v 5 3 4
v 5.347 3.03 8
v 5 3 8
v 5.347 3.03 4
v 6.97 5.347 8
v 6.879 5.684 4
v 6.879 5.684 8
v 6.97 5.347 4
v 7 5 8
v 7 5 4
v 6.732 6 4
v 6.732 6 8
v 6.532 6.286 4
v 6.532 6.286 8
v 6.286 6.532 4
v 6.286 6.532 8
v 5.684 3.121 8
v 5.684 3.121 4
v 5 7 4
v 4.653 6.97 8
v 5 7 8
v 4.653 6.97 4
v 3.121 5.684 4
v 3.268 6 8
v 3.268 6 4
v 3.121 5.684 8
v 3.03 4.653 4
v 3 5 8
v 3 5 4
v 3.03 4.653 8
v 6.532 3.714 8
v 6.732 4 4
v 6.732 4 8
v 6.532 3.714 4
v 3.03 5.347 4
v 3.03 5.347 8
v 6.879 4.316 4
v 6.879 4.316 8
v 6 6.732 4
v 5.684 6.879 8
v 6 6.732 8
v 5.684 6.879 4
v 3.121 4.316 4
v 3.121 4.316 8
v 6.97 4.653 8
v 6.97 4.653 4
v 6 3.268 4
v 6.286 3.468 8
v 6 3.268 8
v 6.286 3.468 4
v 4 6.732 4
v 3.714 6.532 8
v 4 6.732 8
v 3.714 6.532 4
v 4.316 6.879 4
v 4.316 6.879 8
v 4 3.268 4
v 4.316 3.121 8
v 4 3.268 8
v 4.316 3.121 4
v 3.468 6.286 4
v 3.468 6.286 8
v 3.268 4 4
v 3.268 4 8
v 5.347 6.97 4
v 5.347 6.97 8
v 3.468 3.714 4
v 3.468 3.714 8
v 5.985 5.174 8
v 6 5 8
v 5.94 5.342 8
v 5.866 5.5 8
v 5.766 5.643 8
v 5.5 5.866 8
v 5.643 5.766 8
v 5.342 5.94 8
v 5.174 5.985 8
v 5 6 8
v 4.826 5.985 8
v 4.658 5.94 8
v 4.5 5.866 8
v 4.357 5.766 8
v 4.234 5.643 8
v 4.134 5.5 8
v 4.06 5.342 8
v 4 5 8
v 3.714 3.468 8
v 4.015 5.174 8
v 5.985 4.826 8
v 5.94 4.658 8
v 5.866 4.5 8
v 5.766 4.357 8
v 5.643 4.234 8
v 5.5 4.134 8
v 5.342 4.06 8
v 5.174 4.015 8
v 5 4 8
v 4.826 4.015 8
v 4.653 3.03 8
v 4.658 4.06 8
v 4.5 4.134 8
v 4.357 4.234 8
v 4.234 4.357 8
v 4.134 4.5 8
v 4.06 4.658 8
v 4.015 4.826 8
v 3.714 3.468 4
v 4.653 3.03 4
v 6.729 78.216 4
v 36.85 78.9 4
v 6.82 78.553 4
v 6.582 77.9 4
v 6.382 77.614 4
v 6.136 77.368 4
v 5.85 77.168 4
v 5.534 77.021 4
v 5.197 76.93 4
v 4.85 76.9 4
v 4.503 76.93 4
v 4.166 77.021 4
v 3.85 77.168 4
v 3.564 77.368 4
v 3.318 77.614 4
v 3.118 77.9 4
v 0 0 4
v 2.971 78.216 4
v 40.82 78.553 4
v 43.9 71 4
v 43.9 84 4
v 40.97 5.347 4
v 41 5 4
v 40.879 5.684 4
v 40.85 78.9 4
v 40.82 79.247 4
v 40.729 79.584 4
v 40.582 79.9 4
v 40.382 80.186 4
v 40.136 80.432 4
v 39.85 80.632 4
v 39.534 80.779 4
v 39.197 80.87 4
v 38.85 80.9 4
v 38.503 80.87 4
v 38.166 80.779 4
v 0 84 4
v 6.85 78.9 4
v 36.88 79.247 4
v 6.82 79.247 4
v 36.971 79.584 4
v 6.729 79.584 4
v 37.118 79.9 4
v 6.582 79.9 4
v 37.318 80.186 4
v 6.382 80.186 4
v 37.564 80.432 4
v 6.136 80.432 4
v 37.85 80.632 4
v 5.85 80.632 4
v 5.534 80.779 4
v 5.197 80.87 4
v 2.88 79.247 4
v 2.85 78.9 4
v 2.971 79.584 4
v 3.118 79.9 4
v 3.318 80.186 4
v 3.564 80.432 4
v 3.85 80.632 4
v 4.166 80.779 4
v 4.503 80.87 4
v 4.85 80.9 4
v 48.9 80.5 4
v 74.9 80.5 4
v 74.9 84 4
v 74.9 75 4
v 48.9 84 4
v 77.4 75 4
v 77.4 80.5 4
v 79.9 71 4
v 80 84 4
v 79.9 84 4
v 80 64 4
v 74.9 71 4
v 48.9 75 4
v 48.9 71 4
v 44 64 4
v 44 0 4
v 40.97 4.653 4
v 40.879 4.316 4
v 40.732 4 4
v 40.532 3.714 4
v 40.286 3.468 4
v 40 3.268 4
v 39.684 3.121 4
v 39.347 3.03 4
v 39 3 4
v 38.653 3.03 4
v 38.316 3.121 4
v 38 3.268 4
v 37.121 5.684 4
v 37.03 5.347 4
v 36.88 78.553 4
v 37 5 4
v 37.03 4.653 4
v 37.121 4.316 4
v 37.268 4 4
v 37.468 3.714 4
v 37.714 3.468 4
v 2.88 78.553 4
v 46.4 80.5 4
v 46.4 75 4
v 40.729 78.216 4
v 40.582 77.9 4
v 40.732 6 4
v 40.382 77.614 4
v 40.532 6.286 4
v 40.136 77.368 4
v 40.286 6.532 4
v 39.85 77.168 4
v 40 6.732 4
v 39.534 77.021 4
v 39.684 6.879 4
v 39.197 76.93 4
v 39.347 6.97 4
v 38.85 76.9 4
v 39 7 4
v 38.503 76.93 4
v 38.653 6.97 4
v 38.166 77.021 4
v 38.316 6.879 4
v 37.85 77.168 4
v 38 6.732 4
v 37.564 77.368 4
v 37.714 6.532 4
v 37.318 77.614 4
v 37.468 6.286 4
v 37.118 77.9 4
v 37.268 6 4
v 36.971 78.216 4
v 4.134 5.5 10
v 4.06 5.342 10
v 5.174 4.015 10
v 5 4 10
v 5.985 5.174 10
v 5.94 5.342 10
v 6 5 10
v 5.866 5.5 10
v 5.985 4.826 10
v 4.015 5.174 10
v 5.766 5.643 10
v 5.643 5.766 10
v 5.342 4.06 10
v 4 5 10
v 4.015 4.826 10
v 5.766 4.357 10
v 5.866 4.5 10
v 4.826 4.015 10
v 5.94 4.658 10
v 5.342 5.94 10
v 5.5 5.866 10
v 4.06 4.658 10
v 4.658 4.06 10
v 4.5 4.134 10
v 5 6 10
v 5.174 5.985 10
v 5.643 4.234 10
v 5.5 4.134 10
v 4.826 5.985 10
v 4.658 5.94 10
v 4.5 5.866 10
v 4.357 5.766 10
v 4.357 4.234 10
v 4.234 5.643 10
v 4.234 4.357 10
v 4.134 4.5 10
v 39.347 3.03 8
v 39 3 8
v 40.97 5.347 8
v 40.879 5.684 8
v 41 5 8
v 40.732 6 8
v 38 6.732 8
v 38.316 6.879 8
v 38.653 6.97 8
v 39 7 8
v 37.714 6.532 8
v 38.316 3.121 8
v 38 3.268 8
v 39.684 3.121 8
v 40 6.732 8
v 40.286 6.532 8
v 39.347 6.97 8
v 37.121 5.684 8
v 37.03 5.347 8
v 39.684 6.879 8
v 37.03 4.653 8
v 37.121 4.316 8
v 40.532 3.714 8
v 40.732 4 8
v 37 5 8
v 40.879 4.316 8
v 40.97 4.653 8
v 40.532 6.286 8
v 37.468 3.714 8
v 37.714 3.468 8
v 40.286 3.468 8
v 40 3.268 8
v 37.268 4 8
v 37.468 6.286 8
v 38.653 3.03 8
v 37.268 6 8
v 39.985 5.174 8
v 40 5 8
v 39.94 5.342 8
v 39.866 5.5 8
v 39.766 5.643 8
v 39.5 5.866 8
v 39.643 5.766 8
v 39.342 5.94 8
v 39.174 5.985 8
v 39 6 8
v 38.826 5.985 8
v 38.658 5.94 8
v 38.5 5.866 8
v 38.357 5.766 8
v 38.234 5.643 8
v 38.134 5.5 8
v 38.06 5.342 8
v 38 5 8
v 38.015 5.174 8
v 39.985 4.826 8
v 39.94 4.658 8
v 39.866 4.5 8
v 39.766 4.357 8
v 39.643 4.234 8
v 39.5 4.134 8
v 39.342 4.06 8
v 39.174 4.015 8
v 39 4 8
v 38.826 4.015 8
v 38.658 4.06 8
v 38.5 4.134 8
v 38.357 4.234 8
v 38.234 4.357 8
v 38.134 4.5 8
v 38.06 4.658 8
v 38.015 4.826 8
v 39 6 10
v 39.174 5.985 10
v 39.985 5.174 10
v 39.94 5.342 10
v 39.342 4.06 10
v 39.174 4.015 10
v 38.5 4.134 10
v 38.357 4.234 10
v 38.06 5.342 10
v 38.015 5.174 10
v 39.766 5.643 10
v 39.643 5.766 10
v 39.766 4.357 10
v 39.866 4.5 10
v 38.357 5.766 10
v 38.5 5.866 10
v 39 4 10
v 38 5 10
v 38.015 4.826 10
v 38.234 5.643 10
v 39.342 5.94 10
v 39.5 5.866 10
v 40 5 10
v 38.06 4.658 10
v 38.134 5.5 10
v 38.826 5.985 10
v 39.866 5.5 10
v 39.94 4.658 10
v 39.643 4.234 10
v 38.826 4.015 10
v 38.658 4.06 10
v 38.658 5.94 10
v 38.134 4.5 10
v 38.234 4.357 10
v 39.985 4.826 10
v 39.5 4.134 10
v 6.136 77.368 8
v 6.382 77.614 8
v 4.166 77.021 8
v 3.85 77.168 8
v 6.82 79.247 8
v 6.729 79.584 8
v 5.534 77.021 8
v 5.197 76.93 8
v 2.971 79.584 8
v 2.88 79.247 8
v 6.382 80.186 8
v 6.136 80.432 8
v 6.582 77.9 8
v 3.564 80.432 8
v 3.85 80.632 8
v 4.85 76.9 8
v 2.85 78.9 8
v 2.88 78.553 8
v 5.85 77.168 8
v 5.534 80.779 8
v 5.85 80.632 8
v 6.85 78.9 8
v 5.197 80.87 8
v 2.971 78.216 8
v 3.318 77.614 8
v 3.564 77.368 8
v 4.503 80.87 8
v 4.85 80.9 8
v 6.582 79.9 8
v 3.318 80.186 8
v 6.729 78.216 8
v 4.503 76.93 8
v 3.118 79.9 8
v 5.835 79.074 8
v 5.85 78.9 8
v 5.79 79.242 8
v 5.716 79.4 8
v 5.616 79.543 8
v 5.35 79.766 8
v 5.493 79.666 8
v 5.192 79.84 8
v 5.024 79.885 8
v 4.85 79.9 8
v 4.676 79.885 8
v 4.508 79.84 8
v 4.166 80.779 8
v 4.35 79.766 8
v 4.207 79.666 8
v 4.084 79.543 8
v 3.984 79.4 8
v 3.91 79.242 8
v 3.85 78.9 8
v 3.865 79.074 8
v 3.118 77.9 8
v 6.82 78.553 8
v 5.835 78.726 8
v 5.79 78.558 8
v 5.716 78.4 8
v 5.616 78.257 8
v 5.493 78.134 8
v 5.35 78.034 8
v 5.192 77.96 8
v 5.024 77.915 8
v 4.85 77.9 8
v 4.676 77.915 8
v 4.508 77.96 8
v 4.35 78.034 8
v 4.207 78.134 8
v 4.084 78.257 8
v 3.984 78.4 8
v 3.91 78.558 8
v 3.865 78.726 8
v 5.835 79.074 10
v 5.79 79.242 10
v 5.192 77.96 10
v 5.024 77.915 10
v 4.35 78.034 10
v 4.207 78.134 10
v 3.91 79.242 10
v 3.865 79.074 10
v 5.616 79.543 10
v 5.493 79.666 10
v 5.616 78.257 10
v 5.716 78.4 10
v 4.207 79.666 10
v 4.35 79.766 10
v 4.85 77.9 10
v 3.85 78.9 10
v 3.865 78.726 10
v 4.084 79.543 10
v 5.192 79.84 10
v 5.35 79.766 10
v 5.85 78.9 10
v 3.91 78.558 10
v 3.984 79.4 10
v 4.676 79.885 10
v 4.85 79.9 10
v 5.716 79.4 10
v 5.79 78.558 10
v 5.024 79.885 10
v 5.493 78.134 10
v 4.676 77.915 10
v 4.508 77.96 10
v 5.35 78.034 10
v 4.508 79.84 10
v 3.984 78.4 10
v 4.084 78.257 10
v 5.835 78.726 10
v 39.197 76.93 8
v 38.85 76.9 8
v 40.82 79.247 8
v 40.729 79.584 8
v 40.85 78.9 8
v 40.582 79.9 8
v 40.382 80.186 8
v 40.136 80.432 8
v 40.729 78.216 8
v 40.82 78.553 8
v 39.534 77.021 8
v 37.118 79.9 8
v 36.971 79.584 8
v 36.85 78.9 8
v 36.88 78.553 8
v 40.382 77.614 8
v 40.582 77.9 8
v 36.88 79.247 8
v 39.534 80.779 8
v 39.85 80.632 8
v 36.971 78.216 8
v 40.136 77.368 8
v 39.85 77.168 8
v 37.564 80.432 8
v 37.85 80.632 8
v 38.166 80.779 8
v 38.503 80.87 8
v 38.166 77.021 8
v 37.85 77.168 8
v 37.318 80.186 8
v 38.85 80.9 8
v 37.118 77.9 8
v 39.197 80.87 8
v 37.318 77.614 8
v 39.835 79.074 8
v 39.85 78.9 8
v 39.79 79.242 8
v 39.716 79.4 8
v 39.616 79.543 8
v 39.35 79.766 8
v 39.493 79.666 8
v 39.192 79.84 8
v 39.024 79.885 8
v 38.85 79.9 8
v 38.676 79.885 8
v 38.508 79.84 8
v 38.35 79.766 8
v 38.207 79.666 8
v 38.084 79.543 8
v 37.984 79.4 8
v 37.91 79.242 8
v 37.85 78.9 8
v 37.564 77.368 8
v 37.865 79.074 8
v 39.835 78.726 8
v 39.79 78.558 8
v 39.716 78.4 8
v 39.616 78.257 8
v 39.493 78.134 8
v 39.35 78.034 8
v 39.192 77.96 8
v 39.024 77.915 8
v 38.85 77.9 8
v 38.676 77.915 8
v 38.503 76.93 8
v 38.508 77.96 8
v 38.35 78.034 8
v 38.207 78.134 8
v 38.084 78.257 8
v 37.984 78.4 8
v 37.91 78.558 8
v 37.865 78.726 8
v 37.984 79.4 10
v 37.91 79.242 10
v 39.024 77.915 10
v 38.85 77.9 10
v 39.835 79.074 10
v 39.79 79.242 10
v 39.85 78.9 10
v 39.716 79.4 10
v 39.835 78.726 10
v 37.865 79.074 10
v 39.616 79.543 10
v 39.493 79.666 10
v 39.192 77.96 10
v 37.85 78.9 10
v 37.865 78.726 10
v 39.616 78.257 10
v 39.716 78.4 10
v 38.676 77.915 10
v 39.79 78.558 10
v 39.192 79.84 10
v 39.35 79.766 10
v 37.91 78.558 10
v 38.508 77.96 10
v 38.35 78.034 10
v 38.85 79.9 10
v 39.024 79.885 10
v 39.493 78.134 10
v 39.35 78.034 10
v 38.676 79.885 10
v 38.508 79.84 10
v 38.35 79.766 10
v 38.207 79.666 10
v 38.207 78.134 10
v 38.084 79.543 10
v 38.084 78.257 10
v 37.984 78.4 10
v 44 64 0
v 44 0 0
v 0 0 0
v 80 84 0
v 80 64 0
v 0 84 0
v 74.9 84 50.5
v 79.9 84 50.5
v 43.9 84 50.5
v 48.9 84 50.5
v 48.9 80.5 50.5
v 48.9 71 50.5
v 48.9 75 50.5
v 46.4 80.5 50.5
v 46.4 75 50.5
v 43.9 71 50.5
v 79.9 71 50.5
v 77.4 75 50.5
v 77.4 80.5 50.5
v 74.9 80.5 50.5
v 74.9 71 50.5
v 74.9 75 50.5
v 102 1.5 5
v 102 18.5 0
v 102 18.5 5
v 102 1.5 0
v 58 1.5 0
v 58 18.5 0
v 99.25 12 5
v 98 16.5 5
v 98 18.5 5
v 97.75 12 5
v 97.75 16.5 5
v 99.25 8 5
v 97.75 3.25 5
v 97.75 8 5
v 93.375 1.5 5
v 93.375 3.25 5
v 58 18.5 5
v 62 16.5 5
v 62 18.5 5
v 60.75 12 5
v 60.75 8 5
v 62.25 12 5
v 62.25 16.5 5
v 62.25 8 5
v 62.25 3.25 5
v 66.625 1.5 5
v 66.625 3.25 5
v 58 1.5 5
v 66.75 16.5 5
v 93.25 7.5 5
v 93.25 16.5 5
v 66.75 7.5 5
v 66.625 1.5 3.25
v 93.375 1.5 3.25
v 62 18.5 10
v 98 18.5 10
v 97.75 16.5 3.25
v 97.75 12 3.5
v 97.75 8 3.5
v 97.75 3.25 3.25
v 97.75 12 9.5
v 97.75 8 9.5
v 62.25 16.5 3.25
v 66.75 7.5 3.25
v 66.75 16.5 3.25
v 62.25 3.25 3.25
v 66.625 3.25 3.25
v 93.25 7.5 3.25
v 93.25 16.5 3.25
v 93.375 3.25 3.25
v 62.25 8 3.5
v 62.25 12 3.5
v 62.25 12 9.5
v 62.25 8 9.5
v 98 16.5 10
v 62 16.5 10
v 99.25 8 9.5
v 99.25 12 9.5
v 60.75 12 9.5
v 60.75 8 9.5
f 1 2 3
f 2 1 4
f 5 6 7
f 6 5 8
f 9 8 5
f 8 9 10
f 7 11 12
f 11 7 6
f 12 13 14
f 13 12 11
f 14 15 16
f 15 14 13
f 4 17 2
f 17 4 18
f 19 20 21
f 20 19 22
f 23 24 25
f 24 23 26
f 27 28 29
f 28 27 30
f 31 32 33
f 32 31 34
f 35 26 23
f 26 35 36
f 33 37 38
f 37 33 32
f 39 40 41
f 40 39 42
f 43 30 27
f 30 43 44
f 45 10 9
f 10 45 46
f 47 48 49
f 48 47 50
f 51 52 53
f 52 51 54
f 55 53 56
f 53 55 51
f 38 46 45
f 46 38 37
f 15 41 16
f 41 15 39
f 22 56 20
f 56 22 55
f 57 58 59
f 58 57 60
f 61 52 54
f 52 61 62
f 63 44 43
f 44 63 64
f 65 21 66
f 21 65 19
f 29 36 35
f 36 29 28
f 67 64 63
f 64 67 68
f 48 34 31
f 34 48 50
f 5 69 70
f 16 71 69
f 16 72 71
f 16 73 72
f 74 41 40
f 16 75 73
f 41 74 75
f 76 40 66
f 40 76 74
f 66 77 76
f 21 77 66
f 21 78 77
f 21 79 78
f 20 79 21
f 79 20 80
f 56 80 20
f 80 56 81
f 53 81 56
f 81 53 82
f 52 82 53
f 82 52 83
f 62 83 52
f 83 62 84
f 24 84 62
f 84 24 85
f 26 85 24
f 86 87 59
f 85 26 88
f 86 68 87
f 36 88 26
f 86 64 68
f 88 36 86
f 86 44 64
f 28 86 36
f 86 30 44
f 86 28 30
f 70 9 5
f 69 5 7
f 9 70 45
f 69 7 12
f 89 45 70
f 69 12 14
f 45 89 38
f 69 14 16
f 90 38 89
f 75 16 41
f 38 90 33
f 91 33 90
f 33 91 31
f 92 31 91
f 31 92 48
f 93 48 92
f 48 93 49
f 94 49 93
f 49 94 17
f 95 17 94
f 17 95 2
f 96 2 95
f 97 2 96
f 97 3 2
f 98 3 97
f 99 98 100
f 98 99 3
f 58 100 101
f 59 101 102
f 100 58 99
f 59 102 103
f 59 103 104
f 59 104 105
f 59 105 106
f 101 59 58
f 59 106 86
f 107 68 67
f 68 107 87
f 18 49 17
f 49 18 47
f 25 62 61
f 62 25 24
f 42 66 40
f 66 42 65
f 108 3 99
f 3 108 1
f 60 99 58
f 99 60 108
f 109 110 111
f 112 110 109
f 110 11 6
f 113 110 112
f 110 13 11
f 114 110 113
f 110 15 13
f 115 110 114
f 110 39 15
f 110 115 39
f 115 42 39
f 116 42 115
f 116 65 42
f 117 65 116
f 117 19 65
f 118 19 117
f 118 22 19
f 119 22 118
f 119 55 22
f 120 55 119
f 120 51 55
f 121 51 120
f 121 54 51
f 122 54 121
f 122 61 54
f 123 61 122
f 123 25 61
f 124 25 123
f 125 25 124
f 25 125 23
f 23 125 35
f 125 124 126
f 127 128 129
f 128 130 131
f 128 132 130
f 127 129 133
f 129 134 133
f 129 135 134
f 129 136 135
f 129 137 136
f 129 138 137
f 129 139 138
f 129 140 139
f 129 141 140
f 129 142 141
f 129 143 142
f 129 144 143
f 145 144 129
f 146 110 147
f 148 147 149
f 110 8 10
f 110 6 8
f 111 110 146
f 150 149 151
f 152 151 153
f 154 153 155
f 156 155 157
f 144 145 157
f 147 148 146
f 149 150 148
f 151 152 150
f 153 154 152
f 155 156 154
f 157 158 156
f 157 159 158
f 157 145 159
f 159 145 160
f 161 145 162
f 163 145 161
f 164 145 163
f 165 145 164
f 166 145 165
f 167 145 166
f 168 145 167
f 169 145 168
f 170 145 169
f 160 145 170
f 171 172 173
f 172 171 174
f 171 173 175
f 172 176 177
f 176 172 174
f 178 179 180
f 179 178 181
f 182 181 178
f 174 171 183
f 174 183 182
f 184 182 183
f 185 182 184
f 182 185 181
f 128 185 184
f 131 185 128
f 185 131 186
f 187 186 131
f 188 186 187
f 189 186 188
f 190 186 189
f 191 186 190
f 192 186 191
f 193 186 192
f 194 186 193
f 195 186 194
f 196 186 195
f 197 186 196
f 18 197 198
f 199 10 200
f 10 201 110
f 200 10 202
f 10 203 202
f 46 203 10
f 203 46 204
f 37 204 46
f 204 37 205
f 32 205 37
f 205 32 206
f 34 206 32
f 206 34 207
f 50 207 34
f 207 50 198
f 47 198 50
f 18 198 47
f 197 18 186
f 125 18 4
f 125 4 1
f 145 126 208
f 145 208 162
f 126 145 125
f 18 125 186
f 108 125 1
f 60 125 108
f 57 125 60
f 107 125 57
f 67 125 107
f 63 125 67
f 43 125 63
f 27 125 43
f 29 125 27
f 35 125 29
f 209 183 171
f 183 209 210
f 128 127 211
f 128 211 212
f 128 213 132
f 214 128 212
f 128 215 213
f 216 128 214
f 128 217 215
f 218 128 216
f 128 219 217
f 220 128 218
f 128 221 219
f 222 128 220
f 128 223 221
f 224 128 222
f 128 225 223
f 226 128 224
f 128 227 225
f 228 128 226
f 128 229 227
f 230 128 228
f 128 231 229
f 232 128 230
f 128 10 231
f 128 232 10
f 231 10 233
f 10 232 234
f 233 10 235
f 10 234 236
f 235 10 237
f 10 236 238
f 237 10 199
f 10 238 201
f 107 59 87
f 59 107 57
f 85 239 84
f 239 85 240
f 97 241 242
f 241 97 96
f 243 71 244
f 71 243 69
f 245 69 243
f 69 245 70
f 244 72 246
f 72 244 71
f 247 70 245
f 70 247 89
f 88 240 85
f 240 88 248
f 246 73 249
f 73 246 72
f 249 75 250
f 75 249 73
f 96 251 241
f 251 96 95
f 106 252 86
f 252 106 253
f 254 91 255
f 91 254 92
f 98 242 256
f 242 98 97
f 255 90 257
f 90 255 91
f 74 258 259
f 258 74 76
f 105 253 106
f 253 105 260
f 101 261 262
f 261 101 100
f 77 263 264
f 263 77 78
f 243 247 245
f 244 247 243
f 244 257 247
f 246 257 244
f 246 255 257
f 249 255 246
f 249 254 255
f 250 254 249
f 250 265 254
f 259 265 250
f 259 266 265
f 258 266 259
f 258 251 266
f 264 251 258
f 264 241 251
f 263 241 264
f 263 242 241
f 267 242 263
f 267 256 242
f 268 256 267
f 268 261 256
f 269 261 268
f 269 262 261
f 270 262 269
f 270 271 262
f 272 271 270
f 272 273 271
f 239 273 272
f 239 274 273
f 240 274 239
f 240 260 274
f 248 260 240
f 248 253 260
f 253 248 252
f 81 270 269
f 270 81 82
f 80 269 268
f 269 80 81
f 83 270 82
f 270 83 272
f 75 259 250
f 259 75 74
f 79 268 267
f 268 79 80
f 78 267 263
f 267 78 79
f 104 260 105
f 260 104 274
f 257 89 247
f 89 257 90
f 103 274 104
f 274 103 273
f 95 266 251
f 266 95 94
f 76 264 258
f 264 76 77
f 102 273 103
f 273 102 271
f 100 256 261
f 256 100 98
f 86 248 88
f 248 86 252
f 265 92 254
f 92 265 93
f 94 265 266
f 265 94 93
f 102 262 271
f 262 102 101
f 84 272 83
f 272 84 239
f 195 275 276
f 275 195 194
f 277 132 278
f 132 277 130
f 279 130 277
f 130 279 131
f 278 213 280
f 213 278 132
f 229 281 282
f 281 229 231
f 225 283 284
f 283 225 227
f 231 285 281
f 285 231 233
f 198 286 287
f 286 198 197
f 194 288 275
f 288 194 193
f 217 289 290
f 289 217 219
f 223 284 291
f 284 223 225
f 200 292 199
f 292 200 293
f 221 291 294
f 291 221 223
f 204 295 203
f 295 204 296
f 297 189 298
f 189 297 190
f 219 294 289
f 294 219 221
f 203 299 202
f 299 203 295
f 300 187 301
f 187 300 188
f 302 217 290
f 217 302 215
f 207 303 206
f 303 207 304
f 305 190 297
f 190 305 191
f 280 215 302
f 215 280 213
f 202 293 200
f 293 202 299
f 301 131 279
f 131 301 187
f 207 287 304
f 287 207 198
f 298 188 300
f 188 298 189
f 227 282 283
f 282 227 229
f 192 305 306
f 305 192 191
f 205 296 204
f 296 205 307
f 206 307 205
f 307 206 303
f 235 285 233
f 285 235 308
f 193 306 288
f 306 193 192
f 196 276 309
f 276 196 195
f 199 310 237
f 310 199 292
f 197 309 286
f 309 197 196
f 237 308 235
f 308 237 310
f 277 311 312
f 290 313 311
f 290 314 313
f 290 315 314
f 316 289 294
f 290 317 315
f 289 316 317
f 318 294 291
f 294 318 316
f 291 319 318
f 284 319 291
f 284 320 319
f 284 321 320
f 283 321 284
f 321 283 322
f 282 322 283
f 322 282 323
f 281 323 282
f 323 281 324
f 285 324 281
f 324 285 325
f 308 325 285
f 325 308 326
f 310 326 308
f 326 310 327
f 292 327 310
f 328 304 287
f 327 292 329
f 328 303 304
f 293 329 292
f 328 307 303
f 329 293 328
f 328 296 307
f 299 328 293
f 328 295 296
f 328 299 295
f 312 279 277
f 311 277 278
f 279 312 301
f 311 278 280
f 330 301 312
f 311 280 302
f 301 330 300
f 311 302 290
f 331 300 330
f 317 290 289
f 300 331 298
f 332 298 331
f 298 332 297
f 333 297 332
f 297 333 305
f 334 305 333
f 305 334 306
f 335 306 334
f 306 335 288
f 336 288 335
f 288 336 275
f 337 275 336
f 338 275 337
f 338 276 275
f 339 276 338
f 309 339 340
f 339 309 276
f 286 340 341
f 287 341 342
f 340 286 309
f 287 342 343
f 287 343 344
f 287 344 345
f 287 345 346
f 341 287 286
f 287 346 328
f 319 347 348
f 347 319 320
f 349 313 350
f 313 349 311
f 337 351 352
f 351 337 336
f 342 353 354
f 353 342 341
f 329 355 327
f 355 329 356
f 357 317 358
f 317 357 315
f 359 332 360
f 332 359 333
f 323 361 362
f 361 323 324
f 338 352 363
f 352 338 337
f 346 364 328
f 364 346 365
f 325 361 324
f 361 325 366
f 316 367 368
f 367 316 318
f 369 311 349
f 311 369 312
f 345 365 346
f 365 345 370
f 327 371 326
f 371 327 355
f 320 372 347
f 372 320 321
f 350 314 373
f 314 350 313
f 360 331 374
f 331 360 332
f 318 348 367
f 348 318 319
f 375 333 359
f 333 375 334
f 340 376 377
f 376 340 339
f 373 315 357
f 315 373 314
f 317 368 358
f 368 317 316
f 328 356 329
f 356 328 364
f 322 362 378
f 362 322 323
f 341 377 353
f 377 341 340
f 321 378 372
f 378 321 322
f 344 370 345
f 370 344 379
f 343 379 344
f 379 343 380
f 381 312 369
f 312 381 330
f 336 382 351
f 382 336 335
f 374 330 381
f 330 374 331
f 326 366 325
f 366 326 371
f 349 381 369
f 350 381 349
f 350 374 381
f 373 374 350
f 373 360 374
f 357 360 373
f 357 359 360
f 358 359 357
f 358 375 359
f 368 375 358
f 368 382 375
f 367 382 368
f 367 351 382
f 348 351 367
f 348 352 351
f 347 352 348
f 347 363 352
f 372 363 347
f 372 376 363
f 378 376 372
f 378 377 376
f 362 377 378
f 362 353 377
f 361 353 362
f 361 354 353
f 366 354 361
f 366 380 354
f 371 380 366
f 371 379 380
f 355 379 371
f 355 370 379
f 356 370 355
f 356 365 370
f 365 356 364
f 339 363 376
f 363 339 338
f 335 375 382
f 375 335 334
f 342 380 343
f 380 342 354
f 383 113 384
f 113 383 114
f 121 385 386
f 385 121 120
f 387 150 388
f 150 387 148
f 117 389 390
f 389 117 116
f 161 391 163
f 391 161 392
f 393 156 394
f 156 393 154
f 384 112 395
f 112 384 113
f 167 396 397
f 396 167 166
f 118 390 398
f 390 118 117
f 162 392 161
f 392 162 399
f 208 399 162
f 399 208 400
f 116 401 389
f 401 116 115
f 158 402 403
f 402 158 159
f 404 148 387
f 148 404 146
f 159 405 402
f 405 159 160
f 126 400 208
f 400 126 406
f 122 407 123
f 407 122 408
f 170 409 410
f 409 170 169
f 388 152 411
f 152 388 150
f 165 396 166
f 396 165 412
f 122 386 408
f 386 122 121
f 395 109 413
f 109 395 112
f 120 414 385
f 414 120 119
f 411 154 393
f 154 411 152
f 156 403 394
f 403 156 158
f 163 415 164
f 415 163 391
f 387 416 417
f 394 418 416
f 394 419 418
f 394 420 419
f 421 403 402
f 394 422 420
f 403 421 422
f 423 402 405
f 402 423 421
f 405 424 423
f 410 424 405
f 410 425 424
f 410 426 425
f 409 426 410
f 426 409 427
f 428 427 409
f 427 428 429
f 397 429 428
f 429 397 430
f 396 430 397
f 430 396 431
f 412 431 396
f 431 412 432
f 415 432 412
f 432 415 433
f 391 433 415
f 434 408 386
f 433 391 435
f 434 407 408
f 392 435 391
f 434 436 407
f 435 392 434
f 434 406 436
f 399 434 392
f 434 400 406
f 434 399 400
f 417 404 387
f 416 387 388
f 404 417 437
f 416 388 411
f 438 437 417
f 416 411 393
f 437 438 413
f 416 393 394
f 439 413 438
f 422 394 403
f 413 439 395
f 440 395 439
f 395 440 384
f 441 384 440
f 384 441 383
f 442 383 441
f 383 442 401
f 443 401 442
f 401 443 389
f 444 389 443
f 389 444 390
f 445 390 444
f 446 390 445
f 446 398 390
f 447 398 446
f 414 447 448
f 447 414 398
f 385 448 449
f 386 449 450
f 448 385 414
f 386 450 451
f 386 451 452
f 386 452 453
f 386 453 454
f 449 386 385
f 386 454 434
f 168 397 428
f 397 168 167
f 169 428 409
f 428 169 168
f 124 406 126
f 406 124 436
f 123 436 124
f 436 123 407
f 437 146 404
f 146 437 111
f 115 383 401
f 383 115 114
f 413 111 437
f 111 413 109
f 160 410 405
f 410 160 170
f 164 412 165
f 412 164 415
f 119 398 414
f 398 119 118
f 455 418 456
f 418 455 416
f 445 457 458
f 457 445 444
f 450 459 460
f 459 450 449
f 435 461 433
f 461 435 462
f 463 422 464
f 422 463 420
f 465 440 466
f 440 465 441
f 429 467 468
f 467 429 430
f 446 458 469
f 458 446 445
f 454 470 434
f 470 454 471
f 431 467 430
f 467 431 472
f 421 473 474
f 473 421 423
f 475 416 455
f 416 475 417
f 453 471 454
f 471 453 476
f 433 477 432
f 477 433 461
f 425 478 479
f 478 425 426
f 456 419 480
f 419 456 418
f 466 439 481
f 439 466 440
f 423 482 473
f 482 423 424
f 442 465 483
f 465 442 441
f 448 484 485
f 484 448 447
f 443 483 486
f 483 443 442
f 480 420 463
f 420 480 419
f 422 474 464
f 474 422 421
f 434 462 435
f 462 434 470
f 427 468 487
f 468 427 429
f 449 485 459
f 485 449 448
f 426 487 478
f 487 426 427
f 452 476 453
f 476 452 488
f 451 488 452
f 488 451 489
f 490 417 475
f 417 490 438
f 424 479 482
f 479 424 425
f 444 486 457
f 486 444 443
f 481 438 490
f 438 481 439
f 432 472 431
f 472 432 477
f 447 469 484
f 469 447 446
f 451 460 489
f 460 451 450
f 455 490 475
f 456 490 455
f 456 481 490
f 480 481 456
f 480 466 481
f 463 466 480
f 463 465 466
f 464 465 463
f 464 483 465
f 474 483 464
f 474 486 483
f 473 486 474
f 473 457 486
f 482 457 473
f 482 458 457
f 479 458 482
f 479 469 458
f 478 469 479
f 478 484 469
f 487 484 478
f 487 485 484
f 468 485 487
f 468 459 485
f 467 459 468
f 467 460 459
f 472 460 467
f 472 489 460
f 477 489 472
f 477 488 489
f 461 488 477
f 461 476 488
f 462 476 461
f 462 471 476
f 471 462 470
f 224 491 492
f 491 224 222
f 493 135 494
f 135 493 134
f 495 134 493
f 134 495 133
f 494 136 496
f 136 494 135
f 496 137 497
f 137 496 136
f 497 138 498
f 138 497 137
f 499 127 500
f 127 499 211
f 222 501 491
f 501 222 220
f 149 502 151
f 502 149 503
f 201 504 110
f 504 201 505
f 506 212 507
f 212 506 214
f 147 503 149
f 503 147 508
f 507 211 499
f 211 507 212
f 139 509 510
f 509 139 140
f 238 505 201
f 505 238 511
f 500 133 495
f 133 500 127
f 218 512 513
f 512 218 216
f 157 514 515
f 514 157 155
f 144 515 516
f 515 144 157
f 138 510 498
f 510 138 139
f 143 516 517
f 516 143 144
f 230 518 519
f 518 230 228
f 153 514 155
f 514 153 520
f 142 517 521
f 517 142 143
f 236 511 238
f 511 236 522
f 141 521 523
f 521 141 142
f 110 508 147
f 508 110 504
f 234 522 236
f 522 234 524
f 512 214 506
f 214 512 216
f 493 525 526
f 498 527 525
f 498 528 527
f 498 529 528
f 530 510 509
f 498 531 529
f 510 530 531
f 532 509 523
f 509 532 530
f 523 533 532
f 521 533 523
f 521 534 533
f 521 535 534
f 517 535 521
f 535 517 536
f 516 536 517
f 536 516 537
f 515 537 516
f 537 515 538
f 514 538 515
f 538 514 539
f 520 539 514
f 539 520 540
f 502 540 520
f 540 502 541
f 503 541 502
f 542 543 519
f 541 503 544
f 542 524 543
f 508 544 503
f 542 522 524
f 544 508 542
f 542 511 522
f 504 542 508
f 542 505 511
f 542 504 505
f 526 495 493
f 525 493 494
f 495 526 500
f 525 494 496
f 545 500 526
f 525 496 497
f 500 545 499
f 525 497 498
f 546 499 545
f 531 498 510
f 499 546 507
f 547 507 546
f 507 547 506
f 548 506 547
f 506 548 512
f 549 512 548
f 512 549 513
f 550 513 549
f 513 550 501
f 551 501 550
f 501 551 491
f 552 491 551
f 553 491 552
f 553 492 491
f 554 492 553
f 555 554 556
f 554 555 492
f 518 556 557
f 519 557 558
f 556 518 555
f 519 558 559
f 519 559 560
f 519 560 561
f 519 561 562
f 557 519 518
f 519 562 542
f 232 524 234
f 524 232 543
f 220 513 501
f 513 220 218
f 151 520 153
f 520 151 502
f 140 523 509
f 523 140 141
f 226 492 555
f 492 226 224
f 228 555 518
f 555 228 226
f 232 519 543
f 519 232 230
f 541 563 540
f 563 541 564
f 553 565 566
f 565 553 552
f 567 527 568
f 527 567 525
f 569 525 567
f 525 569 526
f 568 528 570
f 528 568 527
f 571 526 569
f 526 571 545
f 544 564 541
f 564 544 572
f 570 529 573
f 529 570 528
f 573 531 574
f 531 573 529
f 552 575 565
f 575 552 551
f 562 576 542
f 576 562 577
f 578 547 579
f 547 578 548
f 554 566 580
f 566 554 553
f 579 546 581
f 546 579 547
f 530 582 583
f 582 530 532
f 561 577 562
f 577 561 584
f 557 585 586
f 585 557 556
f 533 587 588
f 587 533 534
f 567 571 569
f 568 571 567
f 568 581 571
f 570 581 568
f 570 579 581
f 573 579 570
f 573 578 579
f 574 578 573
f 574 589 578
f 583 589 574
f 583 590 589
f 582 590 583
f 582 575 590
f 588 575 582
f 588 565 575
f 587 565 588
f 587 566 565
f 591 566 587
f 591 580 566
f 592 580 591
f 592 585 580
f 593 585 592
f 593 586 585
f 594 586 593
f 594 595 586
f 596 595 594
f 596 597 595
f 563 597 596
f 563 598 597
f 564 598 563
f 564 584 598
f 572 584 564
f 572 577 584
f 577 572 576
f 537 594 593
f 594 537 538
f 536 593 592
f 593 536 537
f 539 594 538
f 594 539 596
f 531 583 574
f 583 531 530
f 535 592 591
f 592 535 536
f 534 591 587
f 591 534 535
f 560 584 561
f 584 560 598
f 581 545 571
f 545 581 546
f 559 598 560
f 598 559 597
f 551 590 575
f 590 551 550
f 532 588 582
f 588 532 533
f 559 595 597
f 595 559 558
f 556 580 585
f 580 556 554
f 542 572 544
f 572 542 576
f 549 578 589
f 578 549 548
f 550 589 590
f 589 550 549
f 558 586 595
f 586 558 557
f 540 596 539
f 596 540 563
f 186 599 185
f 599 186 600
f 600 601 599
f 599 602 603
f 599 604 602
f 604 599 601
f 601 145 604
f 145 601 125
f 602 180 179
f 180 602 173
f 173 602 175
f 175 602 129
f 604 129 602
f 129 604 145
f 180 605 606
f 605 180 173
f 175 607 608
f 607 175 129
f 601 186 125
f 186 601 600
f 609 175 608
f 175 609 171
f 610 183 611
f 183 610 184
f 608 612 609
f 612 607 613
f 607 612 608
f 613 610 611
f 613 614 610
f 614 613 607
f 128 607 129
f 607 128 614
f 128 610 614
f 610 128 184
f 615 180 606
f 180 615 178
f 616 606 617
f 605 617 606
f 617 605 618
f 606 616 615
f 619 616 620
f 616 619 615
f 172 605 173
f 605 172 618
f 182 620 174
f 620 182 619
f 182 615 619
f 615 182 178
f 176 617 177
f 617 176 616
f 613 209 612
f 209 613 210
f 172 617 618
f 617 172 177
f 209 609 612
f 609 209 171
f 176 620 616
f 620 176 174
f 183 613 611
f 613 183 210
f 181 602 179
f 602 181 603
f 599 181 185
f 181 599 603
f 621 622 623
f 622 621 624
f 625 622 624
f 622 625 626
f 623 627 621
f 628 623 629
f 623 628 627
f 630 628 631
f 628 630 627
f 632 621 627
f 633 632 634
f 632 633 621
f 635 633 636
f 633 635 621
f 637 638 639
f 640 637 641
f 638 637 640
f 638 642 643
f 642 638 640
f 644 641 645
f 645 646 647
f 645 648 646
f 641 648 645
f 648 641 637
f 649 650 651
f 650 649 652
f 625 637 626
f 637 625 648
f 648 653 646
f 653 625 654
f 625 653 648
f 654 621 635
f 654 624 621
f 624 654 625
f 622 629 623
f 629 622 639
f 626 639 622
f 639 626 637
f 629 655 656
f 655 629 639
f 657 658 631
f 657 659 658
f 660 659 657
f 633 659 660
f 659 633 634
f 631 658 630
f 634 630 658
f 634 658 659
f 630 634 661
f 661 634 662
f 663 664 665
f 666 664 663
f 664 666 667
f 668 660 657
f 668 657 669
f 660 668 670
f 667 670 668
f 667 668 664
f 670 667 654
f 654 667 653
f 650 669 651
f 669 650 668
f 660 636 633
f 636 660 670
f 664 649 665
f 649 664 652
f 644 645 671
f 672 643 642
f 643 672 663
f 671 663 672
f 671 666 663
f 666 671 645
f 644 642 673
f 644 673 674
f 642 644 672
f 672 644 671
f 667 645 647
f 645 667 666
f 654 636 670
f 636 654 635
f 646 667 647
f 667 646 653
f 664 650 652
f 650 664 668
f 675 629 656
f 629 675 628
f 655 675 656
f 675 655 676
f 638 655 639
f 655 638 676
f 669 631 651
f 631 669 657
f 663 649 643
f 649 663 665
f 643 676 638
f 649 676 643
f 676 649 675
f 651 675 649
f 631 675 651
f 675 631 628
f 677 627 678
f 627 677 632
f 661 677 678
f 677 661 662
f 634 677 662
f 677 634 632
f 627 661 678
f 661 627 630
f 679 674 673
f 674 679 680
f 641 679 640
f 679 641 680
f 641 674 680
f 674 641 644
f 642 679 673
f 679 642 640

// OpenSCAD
// STM32F723 USB Interposer board base plate
// Board: 40x80mm, 4x M2.2 mounting holes
// Standoffs: 4mm dia, 4mm tall; pins: 2mm dia, 2mm tall (for 2mm screws / press fit)

board_w      = 40;
board_h      = 80;
margin       = 2;       // extra plate beyond board edge on each side
plate_thick  = 4;
standoff_d   = 4;
standoff_h   = 4;
pin_d        = 2;       // fits 2.2mm hole with 0.1mm clearance each side
pin_h        = 2;

display_w    = 30;
display_h    = 43.5;
display_t    = 5;
extension_w  = 36;
extension_l  = 20;

plate_w = board_w + 2*margin;
plate_l = board_h + 2*margin;

// Hole positions relative to board top-left corner (mm), from KiCad PCB
holes = [
    [ 3.00,  3.00 ],   // top-left
    [37.00,  3.00 ],   // top-right
    [ 2.85, 76.90 ],   // bottom-left
    [36.85, 76.90 ],   // bottom-right
];

module standoff(x, y) {
    translate([margin + x, margin + y, plate_thick]) {
        cylinder(h=standoff_h, d=standoff_d, $fn=36);
        translate([0, 0, standoff_h])
            cylinder(h=pin_h, d=pin_d, $fn=36);
    }
}

module keeper()
{
	difference() {
		cube([extension_w + 8, display_t + 8 + 4, 5], center=true);
		translate([extension_l - 4.5, 0, -2])
			cube([4.5, display_t + 8.5, 2.5], center = true);
		translate([-extension_l + 4.5, 0, -2])
			cube([4.5, display_t + 8.5, 2.5], center = true);
		translate([0, display_t + 1.5, -2])
			cube([display_w - 3.25, 8, 2.5], center = true);
	}
	translate([0, -display_t - 2.5, -4])
		cube([extension_w, 2, 7], center=true);
	translate([extension_l - 1.5, 0, -4])
		cube([1.5, 4, 6], center = true);
	translate([-extension_l + 1.5, 0, -4])
		cube([1.5, 4, 6], center = true);
}

module base_plate()
{
	// Base plate
	cube([plate_w, plate_l, plate_thick]);

	// Standoffs at each mounting hole
	for (h = holes)
    	standoff(h[0], h[1]);
}

module display()
{
	// Display extension
	translate([plate_w - 0.1, plate_l - extension_l, 0]) {
		cube([extension_w + 0.1, extension_l, plate_thick]);
		translate([0, 0, plate_thick]) difference() {
			union() {
				translate([0, extension_l - display_t - 8, 0])
						cube([5, display_t + 8, display_h + 3]);
				translate([extension_w - 5,
						extension_l - display_t - 8, 0])
					cube([5, display_t + 8, display_h + 3]);
			}
			translate([2.5, extension_l - 9, 0])
				cube([display_w+1, display_t + 0.5, display_h+5]);
		}
	}
	%translate([extension_w/2 + plate_w ,
			extension_l/2 + board_h - (display_t + 8)/2 - 5.7,
			display_h + 7]) keeper();
}

base_plate();
display();
translate([board_w * 2, display_t*2, 2.5]) rotate([180, 0, 0]) keeper();
